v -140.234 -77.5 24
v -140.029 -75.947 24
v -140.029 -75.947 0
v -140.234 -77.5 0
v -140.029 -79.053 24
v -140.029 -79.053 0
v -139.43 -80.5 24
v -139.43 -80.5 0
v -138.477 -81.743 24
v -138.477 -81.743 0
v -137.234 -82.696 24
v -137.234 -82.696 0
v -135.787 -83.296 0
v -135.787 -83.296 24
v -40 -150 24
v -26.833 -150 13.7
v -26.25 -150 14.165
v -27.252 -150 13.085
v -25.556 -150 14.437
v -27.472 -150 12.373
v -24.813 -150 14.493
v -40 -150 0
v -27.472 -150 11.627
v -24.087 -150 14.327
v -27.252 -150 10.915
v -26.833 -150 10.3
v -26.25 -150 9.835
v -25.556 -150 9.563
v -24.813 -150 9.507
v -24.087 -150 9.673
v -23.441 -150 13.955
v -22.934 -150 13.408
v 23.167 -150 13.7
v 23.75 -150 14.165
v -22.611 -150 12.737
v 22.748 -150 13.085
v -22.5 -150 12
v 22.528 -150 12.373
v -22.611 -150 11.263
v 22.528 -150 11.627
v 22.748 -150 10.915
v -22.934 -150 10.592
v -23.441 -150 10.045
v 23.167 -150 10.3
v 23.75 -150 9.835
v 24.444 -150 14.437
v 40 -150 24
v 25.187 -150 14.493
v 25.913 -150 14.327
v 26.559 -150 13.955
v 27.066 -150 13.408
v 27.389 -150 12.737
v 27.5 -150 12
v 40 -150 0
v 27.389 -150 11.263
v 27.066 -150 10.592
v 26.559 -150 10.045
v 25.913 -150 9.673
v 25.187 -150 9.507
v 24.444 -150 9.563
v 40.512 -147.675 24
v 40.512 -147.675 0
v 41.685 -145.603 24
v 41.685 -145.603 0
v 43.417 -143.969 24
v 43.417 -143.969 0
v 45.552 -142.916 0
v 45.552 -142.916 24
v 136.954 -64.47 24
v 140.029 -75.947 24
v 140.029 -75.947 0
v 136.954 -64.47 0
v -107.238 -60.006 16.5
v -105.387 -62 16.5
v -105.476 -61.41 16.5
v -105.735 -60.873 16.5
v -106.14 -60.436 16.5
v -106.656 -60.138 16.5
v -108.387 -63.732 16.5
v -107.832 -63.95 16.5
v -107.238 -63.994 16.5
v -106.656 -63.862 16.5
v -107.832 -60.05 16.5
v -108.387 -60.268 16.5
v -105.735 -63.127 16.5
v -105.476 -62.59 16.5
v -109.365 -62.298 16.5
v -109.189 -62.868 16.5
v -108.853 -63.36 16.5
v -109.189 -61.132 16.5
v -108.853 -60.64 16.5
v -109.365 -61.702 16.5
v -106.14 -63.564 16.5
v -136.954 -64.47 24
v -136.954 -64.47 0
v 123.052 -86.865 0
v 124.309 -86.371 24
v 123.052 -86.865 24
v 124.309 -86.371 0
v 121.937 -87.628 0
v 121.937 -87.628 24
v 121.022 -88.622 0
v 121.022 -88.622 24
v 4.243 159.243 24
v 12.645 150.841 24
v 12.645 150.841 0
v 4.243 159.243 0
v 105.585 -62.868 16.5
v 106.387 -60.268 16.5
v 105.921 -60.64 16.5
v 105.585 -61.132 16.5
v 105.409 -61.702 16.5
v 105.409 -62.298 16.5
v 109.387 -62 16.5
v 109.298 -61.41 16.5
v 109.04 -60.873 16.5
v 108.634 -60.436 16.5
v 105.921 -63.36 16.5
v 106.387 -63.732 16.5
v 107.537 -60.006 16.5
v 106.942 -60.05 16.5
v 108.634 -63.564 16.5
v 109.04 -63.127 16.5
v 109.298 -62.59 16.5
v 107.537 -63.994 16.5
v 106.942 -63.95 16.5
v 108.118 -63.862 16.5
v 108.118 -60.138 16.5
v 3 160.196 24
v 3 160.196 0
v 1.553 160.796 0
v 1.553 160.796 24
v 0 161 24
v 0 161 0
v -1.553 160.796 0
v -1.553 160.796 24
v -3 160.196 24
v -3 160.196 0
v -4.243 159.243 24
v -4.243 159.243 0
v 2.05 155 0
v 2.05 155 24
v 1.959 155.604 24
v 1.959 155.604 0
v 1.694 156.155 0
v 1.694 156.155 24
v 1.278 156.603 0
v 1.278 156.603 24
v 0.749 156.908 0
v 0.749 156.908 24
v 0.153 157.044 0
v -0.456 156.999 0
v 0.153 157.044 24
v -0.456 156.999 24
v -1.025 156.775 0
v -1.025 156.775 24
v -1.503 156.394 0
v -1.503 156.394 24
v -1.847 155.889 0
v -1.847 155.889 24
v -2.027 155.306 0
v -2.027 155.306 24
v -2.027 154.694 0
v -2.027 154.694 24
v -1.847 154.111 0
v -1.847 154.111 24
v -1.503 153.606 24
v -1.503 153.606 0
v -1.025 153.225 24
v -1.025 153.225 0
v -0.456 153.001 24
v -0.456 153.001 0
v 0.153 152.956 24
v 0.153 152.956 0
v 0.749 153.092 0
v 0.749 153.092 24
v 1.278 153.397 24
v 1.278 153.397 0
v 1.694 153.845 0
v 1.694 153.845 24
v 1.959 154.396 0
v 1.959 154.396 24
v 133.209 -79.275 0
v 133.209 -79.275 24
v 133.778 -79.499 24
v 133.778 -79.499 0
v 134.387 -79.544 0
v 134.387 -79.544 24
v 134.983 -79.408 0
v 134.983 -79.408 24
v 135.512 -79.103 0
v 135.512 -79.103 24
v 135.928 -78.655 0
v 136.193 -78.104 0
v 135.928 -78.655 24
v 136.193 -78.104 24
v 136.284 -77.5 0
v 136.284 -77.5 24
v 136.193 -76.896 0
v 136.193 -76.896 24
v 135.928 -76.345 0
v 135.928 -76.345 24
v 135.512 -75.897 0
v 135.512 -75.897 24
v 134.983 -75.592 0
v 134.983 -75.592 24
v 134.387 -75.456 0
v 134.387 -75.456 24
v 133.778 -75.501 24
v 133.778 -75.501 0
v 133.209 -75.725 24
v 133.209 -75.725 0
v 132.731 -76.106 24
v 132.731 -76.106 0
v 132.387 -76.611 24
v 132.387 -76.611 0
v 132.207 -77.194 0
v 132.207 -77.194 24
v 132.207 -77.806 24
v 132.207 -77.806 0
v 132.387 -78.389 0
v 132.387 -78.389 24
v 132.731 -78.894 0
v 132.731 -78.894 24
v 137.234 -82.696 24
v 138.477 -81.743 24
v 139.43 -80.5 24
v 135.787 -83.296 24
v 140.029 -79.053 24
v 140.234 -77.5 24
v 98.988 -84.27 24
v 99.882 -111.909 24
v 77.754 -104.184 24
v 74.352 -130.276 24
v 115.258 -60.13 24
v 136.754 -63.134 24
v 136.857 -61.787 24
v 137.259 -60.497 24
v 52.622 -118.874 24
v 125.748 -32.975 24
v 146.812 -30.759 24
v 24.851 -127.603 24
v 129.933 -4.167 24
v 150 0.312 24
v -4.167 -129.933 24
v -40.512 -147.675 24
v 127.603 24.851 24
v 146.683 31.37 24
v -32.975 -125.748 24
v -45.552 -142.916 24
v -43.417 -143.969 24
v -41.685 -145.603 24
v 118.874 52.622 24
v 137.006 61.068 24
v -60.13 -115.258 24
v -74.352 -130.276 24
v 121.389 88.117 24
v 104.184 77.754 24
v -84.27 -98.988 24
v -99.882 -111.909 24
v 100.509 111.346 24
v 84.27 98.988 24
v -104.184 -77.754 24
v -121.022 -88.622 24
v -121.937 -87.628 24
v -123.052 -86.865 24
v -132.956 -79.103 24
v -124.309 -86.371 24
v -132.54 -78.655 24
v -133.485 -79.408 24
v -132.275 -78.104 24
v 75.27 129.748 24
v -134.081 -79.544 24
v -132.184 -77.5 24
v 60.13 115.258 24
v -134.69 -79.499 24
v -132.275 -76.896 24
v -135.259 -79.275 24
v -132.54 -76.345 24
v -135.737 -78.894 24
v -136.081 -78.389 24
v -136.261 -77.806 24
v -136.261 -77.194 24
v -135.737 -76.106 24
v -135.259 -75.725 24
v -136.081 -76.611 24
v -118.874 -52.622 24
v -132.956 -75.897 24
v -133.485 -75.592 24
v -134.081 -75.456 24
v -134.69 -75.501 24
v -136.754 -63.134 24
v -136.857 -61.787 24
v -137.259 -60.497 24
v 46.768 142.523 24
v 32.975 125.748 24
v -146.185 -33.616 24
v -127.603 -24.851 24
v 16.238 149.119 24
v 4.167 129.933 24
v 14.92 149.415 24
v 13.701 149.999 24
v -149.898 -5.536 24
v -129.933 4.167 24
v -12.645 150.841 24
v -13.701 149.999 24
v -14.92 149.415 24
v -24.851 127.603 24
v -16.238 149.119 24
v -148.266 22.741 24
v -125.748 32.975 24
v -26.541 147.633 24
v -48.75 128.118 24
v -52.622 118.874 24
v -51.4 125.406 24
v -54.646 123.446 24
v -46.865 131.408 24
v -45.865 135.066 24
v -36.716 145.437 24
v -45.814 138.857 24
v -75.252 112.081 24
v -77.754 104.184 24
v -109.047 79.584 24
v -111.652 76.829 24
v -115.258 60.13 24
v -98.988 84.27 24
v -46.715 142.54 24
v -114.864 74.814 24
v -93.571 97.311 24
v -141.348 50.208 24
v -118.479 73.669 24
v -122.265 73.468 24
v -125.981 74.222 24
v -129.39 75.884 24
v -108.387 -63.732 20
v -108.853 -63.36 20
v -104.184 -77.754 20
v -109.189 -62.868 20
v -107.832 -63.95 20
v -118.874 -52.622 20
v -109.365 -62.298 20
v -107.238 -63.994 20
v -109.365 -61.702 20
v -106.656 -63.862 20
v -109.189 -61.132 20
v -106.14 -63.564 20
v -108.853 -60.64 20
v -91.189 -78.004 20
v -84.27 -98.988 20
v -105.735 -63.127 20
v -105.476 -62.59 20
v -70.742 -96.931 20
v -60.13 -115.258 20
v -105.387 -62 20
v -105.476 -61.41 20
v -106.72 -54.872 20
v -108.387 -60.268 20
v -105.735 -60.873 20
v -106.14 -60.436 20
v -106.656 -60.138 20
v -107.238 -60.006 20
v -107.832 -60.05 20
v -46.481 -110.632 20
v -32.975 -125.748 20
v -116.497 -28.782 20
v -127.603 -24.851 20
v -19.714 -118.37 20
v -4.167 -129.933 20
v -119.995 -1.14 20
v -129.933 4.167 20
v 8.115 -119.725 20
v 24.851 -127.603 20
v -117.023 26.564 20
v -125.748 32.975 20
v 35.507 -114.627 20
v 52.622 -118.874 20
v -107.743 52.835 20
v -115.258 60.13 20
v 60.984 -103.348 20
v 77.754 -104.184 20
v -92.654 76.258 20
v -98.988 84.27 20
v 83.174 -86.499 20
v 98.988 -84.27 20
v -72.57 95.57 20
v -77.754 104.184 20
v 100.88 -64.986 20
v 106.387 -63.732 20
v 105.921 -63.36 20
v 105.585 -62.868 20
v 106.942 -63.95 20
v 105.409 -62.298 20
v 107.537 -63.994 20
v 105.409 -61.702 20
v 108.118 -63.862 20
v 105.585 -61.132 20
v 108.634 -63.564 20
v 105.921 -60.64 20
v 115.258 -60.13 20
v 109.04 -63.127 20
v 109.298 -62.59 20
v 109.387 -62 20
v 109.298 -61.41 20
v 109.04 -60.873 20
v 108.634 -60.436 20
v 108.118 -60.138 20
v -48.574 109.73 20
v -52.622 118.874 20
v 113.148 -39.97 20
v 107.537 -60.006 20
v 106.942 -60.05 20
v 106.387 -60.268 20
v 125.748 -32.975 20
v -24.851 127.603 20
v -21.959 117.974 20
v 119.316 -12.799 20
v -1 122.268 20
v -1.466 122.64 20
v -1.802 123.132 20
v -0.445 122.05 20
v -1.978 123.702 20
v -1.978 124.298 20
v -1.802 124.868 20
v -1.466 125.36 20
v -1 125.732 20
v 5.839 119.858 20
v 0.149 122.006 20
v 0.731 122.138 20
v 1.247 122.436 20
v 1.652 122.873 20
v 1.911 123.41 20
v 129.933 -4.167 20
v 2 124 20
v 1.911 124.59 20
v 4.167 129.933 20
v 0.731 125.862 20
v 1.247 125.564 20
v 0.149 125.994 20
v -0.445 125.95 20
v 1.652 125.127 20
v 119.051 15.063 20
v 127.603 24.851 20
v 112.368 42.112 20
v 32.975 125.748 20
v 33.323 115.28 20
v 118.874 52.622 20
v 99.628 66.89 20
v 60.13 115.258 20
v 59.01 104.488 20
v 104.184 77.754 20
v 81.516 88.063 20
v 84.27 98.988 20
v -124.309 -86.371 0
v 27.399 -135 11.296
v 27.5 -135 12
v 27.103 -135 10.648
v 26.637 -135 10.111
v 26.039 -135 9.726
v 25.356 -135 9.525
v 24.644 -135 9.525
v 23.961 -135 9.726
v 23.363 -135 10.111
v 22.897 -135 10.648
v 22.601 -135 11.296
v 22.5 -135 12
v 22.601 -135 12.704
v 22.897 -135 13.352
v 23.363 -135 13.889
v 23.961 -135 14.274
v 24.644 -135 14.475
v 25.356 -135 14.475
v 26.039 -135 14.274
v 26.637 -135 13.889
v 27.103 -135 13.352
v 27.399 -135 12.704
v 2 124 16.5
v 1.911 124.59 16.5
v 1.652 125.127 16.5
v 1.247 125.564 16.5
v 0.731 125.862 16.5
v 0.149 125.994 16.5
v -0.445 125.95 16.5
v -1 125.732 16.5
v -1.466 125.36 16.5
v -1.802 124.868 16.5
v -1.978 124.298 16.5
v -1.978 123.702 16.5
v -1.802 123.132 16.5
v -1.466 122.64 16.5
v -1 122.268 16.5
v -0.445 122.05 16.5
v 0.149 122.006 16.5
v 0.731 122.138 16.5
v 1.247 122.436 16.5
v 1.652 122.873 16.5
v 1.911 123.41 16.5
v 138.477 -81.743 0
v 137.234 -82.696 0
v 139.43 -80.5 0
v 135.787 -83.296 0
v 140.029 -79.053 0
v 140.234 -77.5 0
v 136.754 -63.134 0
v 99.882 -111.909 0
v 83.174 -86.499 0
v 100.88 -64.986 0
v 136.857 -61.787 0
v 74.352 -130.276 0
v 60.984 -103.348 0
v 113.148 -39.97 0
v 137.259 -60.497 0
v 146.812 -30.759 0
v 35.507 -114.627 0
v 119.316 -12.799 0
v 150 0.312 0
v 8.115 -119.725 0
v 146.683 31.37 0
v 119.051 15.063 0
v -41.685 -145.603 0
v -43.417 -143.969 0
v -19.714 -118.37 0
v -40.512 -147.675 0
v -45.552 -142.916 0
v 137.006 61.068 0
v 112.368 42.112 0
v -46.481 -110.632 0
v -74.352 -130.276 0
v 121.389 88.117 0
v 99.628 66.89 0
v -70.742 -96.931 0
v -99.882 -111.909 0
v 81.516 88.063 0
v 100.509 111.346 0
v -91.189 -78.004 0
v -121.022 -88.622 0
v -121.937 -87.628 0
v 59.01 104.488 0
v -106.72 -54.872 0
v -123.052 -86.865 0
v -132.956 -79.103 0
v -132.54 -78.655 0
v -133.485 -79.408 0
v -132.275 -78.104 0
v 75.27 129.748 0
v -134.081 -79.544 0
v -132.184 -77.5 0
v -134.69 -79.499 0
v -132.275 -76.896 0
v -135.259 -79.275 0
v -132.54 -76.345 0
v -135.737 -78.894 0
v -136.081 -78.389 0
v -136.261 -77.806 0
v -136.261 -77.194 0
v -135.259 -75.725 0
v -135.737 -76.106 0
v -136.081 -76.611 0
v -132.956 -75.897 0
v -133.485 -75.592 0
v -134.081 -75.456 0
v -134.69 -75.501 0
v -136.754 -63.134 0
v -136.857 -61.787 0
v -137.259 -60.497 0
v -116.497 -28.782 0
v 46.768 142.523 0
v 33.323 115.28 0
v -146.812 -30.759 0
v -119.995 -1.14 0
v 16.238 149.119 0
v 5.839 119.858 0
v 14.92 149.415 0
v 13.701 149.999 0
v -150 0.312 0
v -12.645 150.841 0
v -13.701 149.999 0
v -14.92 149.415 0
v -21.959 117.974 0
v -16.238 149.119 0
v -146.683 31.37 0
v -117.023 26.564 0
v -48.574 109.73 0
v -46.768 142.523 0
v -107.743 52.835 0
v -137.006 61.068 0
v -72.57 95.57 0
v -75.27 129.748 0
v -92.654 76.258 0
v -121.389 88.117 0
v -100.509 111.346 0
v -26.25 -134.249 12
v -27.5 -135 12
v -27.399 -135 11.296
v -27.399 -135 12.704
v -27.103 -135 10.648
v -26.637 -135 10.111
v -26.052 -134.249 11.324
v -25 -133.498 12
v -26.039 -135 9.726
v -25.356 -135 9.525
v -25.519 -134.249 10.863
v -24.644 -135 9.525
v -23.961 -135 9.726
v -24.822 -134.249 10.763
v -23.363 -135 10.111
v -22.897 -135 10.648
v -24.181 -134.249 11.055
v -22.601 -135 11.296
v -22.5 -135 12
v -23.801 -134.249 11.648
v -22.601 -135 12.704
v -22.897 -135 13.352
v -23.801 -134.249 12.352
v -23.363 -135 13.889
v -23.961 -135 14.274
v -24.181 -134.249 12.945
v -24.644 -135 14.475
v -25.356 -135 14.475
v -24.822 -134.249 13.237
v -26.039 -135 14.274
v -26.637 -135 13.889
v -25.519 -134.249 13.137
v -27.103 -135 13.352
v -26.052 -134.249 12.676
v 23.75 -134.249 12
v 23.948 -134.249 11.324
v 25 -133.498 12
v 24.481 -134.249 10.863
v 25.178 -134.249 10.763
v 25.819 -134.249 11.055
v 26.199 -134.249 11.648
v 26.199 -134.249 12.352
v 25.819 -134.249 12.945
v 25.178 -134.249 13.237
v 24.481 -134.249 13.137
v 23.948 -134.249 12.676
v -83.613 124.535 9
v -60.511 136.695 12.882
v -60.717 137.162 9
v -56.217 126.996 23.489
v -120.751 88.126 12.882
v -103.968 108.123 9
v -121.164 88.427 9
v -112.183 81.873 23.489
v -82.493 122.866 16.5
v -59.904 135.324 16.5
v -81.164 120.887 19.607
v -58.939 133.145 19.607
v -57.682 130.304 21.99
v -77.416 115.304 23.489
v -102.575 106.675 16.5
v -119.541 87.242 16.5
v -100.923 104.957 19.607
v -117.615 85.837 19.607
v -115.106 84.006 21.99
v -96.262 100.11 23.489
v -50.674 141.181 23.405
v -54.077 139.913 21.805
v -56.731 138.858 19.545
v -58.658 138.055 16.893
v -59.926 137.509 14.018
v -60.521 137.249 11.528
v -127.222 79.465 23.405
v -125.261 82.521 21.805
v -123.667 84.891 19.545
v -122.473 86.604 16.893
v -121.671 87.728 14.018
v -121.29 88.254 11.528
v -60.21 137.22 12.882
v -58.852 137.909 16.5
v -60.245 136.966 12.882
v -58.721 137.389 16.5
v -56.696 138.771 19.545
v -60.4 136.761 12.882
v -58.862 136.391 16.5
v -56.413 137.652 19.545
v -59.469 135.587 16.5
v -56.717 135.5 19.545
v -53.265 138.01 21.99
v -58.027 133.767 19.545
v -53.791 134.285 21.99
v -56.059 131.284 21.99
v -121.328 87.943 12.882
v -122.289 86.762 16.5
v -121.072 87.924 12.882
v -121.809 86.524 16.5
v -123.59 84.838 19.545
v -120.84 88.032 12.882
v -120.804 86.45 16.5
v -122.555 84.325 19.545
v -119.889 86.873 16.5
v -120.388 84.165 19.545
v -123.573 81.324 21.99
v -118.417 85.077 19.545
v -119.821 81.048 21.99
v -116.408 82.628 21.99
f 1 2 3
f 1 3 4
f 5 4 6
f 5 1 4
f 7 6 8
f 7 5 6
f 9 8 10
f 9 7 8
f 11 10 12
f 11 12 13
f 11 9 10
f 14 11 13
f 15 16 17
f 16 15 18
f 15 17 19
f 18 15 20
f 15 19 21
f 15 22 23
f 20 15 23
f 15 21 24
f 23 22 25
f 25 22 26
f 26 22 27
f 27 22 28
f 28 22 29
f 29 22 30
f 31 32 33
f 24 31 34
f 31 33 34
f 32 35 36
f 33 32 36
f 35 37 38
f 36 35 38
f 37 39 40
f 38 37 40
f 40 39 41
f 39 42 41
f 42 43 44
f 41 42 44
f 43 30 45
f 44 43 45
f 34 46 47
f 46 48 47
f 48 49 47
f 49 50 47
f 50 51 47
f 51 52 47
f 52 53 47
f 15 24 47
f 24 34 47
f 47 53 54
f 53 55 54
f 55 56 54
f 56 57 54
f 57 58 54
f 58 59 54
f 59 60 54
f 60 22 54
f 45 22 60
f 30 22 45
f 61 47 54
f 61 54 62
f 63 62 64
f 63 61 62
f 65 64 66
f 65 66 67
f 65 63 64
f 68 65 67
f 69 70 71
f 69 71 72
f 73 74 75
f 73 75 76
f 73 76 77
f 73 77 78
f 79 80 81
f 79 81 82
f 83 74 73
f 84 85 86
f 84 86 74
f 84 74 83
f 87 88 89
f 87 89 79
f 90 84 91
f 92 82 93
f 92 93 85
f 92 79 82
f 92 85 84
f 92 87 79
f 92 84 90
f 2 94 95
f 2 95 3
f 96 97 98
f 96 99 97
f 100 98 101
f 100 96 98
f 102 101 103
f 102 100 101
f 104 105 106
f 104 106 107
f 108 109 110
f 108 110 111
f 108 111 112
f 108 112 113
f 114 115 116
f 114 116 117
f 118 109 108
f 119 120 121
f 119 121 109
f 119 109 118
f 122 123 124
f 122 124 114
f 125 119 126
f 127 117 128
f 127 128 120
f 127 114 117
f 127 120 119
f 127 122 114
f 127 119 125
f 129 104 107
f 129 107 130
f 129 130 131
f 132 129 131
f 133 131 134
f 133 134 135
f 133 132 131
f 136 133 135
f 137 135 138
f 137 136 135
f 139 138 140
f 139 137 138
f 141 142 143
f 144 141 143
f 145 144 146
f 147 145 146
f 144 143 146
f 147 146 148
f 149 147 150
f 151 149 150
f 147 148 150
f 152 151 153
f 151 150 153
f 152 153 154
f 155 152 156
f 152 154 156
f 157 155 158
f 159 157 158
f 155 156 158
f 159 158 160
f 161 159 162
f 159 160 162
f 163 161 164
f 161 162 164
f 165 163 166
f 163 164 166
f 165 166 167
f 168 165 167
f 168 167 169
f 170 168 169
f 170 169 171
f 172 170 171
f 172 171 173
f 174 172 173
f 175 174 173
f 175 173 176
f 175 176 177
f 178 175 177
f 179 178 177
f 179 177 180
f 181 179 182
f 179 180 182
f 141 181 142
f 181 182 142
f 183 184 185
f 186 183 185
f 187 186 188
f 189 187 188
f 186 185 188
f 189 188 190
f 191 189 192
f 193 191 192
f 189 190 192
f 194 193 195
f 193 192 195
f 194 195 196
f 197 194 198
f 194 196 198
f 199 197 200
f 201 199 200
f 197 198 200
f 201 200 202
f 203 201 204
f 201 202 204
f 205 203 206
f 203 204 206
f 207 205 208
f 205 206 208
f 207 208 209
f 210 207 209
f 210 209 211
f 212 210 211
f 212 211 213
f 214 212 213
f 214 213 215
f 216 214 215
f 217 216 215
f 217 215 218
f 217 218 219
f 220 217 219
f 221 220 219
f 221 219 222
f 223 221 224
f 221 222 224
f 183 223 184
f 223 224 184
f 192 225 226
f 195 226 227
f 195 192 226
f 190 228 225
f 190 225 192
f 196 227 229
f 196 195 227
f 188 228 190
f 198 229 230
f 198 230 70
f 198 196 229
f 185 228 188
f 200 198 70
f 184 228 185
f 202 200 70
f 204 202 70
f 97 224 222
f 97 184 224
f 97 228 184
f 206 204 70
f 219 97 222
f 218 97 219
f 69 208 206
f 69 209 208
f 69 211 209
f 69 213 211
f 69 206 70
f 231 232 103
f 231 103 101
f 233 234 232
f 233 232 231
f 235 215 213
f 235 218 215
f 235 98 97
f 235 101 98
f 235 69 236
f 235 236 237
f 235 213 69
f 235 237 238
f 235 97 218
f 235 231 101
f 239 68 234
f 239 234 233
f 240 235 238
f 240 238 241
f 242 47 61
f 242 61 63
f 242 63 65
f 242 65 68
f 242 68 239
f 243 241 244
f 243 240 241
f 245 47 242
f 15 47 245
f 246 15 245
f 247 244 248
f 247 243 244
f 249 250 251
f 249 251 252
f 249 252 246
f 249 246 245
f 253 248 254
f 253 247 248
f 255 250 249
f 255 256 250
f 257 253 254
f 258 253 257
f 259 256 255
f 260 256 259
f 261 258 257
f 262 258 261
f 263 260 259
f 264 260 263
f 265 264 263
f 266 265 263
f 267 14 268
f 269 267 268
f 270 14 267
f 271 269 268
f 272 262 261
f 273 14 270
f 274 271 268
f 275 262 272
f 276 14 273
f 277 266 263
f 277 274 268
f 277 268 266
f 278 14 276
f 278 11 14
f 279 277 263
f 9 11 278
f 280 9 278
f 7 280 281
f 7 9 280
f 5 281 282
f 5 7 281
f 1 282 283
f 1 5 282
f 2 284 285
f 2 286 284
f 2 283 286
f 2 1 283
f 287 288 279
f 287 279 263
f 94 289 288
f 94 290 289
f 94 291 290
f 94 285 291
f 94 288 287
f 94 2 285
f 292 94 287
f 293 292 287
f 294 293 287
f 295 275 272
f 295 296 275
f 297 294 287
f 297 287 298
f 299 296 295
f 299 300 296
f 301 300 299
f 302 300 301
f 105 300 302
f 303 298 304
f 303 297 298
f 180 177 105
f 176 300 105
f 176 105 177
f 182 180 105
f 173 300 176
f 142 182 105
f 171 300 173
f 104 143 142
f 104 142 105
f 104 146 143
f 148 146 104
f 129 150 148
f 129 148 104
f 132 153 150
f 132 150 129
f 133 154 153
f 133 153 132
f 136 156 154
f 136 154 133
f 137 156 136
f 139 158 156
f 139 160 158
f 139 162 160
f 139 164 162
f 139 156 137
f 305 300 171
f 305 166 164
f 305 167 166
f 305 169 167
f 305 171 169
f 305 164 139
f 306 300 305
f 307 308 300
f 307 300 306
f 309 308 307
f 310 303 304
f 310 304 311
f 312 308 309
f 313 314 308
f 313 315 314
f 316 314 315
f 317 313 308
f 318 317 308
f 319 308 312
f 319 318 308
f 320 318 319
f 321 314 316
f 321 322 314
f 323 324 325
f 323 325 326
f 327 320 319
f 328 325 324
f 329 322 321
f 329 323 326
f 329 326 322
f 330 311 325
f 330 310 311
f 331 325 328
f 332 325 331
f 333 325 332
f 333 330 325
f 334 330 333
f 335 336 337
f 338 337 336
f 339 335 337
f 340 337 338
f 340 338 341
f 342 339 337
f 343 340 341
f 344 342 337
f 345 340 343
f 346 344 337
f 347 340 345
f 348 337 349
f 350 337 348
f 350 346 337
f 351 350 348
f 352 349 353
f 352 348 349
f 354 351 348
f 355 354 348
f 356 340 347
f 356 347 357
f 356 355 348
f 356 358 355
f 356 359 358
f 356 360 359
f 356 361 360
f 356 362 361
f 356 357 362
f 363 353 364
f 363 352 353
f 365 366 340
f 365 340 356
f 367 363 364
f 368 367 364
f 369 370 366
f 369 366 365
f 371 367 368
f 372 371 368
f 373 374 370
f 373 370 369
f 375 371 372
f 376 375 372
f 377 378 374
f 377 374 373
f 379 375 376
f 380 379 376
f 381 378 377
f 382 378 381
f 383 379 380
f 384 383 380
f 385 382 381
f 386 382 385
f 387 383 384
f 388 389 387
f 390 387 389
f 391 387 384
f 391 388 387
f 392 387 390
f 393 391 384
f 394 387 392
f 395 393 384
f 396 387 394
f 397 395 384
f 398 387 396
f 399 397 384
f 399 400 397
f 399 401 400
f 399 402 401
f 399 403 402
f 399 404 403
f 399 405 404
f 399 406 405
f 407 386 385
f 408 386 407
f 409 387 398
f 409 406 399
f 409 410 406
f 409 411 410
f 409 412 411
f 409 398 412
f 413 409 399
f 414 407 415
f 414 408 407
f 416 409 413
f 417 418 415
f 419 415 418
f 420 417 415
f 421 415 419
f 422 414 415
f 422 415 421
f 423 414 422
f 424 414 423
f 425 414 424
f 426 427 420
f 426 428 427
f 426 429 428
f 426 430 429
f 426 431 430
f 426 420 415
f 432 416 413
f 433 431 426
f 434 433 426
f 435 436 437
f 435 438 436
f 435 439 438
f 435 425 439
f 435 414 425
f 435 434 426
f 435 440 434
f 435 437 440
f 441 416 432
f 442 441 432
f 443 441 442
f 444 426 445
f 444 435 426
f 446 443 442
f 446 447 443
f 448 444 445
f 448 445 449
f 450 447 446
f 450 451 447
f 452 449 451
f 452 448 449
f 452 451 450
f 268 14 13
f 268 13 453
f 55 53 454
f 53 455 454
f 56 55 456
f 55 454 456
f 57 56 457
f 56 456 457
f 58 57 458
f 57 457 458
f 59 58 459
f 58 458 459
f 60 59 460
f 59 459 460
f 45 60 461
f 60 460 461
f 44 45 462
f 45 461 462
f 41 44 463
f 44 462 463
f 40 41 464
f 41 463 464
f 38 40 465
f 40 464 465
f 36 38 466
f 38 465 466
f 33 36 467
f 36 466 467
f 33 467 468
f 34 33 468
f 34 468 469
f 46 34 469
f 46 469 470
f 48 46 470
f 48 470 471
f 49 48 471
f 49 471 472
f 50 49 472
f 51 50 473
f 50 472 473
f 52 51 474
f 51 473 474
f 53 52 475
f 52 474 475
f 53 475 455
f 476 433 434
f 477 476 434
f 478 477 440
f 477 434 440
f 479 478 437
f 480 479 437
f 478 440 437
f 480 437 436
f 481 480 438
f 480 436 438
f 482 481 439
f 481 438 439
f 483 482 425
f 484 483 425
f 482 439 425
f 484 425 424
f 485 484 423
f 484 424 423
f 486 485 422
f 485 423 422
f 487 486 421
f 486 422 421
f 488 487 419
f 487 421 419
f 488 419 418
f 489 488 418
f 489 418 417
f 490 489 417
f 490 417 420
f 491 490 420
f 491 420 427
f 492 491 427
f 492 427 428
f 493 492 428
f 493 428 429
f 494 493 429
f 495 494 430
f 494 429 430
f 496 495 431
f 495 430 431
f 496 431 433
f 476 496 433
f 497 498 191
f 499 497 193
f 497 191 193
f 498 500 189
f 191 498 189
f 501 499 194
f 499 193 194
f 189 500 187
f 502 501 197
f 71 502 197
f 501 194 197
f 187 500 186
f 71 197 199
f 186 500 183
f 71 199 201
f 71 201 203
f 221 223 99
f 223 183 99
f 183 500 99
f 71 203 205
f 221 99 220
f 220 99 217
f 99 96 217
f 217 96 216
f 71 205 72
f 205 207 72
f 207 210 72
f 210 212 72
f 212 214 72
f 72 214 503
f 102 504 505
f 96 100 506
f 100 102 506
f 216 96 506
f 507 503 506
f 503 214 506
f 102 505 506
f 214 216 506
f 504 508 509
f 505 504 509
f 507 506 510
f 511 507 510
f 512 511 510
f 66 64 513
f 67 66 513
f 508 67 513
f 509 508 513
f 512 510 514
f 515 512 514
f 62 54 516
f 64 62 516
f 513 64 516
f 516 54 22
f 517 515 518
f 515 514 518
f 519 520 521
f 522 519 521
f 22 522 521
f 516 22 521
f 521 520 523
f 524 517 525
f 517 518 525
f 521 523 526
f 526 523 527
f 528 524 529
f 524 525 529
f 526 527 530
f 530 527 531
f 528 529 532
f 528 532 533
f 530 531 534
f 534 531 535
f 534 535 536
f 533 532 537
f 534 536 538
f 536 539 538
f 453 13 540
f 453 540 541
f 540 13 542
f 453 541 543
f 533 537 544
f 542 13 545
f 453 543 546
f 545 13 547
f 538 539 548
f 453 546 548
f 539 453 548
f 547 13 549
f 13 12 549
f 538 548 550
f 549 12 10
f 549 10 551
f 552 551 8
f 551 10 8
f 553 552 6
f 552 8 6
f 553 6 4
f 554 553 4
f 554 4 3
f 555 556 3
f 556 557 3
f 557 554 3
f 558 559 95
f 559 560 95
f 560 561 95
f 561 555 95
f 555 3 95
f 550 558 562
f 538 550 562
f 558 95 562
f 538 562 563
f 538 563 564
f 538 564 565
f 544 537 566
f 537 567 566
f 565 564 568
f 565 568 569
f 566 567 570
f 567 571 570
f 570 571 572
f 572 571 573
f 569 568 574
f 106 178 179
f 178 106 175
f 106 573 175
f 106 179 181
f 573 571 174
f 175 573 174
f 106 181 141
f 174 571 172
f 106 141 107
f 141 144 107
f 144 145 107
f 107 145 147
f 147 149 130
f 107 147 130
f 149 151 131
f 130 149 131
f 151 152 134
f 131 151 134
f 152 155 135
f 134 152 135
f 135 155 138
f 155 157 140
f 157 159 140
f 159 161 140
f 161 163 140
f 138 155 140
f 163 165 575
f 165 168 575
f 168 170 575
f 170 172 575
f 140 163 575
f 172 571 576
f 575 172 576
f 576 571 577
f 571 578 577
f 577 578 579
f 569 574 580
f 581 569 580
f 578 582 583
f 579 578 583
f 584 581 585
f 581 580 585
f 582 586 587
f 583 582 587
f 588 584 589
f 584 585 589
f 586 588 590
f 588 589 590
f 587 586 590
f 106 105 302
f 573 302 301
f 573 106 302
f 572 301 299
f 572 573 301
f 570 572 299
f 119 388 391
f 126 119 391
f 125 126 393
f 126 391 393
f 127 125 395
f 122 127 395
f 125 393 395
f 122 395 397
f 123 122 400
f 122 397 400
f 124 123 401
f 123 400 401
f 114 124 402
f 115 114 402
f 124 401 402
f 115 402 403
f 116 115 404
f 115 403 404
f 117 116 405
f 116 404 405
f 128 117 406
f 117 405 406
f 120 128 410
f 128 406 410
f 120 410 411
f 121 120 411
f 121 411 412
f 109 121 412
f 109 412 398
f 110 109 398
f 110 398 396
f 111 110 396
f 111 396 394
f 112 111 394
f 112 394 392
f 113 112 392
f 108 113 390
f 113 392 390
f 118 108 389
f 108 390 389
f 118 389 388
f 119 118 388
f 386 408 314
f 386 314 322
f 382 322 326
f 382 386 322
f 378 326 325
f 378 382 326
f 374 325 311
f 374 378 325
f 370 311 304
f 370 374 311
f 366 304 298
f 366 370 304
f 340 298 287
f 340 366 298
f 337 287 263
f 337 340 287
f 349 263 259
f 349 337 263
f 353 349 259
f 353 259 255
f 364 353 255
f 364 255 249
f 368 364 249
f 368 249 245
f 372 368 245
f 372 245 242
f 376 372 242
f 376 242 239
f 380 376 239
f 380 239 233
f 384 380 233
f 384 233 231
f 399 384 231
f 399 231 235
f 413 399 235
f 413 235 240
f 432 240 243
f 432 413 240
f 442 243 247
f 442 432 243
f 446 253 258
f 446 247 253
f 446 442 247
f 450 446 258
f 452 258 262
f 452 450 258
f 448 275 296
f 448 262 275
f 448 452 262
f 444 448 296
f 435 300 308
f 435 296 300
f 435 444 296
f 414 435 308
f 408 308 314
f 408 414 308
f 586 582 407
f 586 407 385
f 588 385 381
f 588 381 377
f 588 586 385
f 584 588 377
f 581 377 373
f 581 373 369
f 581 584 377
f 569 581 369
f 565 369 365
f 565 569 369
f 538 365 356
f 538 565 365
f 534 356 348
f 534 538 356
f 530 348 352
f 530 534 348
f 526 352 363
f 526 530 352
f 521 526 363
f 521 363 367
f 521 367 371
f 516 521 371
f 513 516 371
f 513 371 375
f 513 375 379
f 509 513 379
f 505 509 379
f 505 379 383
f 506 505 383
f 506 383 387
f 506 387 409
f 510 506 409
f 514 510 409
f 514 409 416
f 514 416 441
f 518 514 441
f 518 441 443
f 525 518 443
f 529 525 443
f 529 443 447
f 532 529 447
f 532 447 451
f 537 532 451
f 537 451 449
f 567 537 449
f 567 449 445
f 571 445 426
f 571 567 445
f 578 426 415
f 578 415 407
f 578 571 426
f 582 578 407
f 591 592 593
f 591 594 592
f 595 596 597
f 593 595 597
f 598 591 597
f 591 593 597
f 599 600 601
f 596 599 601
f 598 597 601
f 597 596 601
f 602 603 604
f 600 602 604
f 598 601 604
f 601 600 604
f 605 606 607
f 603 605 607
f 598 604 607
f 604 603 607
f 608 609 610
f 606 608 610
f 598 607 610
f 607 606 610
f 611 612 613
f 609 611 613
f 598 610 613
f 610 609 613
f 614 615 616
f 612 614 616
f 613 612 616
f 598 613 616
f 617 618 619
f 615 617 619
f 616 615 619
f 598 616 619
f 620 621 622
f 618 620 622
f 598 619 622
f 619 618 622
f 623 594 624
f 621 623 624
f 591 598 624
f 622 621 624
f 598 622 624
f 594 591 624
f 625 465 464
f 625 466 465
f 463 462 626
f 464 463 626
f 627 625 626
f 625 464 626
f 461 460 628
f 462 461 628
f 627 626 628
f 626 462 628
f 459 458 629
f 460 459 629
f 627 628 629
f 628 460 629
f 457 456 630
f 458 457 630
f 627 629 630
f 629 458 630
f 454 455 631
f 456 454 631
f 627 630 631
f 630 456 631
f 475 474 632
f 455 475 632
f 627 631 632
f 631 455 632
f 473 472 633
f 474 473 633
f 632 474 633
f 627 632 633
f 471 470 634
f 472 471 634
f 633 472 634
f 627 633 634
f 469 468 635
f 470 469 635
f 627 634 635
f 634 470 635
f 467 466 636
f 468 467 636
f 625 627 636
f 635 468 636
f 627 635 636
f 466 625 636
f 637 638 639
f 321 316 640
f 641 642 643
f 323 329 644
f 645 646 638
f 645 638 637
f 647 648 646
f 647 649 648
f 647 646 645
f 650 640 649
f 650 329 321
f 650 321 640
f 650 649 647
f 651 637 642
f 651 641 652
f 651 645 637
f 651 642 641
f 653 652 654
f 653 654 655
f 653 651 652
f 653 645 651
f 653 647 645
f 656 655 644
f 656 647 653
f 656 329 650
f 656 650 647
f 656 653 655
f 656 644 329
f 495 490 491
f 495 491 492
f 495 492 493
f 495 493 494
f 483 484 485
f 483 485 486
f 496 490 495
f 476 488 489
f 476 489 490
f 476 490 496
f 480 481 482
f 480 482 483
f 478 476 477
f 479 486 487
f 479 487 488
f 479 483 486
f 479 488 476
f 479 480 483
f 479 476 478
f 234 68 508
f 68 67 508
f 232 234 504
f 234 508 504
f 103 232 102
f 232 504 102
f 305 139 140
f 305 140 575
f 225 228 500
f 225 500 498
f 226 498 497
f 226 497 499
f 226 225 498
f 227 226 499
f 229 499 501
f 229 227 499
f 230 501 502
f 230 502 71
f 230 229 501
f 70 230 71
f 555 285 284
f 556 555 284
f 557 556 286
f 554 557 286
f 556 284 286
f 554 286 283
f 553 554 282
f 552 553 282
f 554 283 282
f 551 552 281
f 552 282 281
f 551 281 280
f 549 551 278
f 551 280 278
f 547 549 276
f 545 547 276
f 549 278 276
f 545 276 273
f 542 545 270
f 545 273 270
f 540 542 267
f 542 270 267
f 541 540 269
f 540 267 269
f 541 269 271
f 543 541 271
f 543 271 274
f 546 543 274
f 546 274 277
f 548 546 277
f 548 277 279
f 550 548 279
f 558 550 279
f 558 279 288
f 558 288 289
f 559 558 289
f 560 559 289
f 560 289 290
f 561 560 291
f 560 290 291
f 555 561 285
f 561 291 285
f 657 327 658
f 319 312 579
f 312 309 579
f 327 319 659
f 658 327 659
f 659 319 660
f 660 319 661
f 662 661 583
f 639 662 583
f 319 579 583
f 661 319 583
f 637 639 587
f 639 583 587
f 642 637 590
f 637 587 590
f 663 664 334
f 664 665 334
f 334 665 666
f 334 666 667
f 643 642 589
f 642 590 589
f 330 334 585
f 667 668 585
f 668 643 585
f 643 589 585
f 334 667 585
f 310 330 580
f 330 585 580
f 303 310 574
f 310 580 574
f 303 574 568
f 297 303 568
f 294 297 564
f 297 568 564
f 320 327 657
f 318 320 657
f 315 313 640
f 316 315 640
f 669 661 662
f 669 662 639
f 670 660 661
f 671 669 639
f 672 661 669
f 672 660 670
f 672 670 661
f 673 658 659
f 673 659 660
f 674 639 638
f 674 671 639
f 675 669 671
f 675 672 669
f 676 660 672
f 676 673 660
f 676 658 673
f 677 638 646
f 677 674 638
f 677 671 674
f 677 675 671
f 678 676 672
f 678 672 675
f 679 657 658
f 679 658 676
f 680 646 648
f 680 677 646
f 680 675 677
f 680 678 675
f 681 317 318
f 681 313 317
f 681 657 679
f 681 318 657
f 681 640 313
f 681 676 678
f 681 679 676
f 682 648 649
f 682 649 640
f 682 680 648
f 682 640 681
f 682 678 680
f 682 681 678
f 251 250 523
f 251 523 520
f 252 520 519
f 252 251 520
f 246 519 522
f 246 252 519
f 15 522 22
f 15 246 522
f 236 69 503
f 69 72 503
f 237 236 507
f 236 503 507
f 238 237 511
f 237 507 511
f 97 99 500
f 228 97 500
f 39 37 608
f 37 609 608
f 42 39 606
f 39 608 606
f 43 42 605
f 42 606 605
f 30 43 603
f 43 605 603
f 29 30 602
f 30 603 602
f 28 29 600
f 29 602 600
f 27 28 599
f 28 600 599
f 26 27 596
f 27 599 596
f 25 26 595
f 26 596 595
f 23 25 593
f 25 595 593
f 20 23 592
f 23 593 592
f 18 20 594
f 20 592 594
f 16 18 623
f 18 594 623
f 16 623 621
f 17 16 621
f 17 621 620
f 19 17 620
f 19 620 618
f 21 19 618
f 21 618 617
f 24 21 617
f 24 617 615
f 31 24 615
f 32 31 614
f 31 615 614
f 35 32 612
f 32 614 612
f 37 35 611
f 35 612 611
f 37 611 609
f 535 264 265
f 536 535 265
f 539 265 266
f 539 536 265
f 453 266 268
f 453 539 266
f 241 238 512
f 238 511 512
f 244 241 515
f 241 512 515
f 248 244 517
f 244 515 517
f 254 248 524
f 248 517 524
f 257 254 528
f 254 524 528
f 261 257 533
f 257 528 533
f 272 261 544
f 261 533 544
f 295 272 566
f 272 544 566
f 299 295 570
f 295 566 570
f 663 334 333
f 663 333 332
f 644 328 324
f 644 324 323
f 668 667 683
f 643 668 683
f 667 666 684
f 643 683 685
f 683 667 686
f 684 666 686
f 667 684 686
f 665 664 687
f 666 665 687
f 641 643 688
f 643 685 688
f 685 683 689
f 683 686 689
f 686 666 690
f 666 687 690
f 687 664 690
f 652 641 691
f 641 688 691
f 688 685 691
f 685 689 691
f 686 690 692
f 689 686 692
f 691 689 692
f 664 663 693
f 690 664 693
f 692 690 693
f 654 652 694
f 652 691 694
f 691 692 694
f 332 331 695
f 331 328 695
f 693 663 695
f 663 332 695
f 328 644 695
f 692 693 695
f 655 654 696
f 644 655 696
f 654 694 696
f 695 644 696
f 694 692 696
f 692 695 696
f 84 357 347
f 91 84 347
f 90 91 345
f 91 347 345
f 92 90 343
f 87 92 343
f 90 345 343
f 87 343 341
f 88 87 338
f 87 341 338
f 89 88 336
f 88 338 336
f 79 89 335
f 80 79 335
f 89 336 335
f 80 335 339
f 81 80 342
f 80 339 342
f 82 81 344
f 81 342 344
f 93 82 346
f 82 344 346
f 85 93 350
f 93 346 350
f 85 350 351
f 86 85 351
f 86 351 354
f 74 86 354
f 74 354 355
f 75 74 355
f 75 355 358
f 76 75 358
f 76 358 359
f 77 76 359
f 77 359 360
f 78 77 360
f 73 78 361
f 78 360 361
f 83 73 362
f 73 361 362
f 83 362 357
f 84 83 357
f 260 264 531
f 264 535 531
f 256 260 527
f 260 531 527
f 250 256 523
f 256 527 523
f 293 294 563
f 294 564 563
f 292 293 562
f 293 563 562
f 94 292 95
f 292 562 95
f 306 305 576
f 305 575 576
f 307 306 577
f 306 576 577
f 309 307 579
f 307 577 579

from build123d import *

# Parameters (mm, degrees)
SKETCH1_R                 = 150.00000000000003
SKETCH1_R_2               = 120
BOSS_EXTRUDE1_DEPTH       = 20
SKETCH2_R                 = 2.0000000000000018
CUT_EXTRUDE1_DEPTH        = 3.5
CIRPATTERN1_COUNT         = 3
SKETCH8_R                 = 150.00000000000006
SKETCH8_R_2               = 130
BOSS_EXTRUDE2_DEPTH       = 4
SPLIT1_SURFACE_1_BACK     = 425.942
SPLIT1_SURFACE_1_DEPTH    = 851.884
SPLIT1_SURFACE_2_BACK     = 425.942
SPLIT1_SURFACE_2_DEPTH    = 851.884
FILLET1_R                 = 15
SKETCH9_R                 = 2.049999999999871
BOSS_EXTRUDE3_DEPTH       = 24
FILLET2_R                 = 6
CIRPATTERN2_COUNT         = 3
FILLET2_OF_CIRPATTERN2_R  = 6
BOSS_EXTRUDE6_REACH       = 348.117
BOSS_EXTRUDE6_END_RADIUS  = 150.00000000000003
FILLET5_R                 = 8
M6X1_0_TAPPED_HOLE1_D     = 5
M6X1_0_TAPPED_HOLE1_DEPTH = 15
M6X1_0_TAPPED_HOLE1_TIP   = 1.5021515475689007


with BuildPart() as part:
    # Sketch1 → Boss-Extrude1 (new body)
    with BuildSketch(Plane.XY):
        Circle(SKETCH1_R)
        Circle(SKETCH1_R_2, mode=Mode.SUBTRACT)
    extrude(amount=BOSS_EXTRUDE1_DEPTH)

    # Sketch2 → Cut-Extrude1 (cut)
    with BuildSketch(Plane.XY.offset(20)):
        with Locations((0, 124)):
            Circle(SKETCH2_R)
    cut_extrude1 = extrude(amount=-CUT_EXTRUDE1_DEPTH, mode=Mode.SUBTRACT)

    # CirPattern1: Cut-Extrude1 ×3 about axis
    cirpattern1_axis = Axis((-4.94e-15, -7.48e-15, 0), (0, 0, 1))
    for i in range(1, CIRPATTERN1_COUNT):
        add(cut_extrude1.rotate(cirpattern1_axis, i * 360 / CIRPATTERN1_COUNT), mode=Mode.SUBTRACT)

    # Sketch8 → Boss-Extrude2 (add)
    with BuildSketch(Plane.XY.offset(20)):
        Circle(SKETCH8_R)
        Circle(SKETCH8_R_2, mode=Mode.SUBTRACT)
    extrude(amount=BOSS_EXTRUDE2_DEPTH)


with BuildPart() as body_2:
    # Split1: the piece behind the surface
    add(part.part)
    # Split1 surface: a surface, the sketch's curves swept straight by 851.884 mm
    with BuildLine(Plane.XY.offset(20).offset(-SPLIT1_SURFACE_1_BACK), mode=Mode.PRIVATE) as split1_surface_1_path:
        Line((-60.71743008822855, 137.16192505021607), (0, 0))
        Line((0, 0), (-121.16379943401968, 88.42699648134986))
    split1_surface_1 = Shell.extrude(split1_surface_1_path.wire(), (0 * SPLIT1_SURFACE_1_DEPTH, 0 * SPLIT1_SURFACE_1_DEPTH, 1 * SPLIT1_SURFACE_1_DEPTH))
    split(bisect_by=split1_surface_1, keep=Keep.BOTTOM)

    # Fillet1
    fillet1_edges = [body_2.edges().sort_by_distance(p)[0] for p in [
        (-94.14865229404315, 116.77341851301341, 24),
    ]]
    fillet(fillet1_edges, radius=FILLET1_R)


with BuildPart() as part_1:
    add(part.part)

    # Split1: split by a surface, the side it looks to stays
    # Split1 surface: a surface, the sketch's curves swept straight by 851.884 mm
    with BuildLine(Plane.XY.offset(20).offset(-SPLIT1_SURFACE_2_BACK), mode=Mode.PRIVATE) as split1_surface_2_path:
        Line((-60.71743008822855, 137.16192505021607), (0, 0))
        Line((0, 0), (-121.16379943401968, 88.42699648134986))
    split1_surface_2 = Shell.extrude(split1_surface_2_path.wire(), (0 * SPLIT1_SURFACE_2_DEPTH, 0 * SPLIT1_SURFACE_2_DEPTH, 1 * SPLIT1_SURFACE_2_DEPTH))
    split(bisect_by=split1_surface_2, keep=Keep.TOP)

    # Sketch6 → Cut-Revolve2 (revolve, cut)
    with BuildSketch(Plane(origin=(0, 0, 0), x_dir=(0, 0, 1), z_dir=(-0.914412833668107, -0.40478286725485696, 0))):
        with BuildLine():
            Line((24, 135.00000000000006), (24, 150.00000000000006))
            Line((24, 150.00000000000006), (9, 150.00000000000006))
            ThreePointArc((9.000000000000004, 150.00000000000006), (19.606601717798213, 145.60660171779824), (23.999999999999993, 135.00000000000003))
        make_face()
    cut_revolve2 = revolve(axis=Axis((-60.71743008822857, 137.1619250502161, 24), (0, 0, -1)), mode=Mode.SUBTRACT)

    # Mirror1: Cut-Revolve2 across plane
    add(cut_revolve2.mirror(Plane(origin=(0, 0, 0), x_dir=(0, 0, 1), z_dir=(-0.7784894567534315, -0.6276576819602762, 0))), mode=Mode.SUBTRACT)


with BuildPart() as body_2_1:
    add(body_2.part)

    # Combine1: union part
    add(part_1.part)

    # Sketch9 → Boss-Extrude3 (add)
    # profile 1 of 3: a face of its own
    with BuildSketch(Plane.XY.offset(24)):
        with BuildLine():
            ThreePointArc((-3.262499377045517, 149.96451612903218), (-5.966798192877617, 154.36966728986033), (-4.24264068711927, 159.2426406871193))
            Line((-4.242640687119266, 159.2426406871193), (-14.15461886744679, 149.33066250679175))
            ThreePointArc((-14.1546188674468, 149.33066250679167), (-8.714324103983273, 149.7466545716823), (-3.2624993770454083, 149.9645161290323))
        make_face()
    # profile 2 of 3: a face of its own
    with BuildSketch(Plane.XY.offset(24)):
        with BuildLine():
            Line((14.154618867446969, 149.3306625067917), (4.242640687119273, 159.24264068711932))
            ThreePointArc((4.242640687119273, 159.24264068711932), (5.543277195067717, 157.29610059419056), (6, 155.00000000000003))
            ThreePointArc((6, 155.00000000000003), (5.27138483997677, 152.13425369774941), (3.262499377045641, 149.96451612903223))
            ThreePointArc((3.262499377045714, 149.96451612903223), (8.714324103983444, 149.7466545716823), (14.154618867446963, 149.33066250679167))
        make_face()
    # profile 3 of 3: a face of its own
    with BuildSketch(Plane.XY.offset(24)):
        with BuildLine():
            ThreePointArc((4.242640687119273, 159.24264068711932), (-3.07e-15, 161), (-4.242640687119268, 159.2426406871193))
            ThreePointArc((-4.24264068711927, 159.2426406871193), (-5.966798192877617, 154.36966728986033), (-3.262499377045517, 149.96451612903218))
            ThreePointArc((-3.2624993770454083, 149.9645161290323), (1.4921e-13, 150), (3.262499377045714, 149.96451612903223))
            ThreePointArc((3.262499377045641, 149.96451612903223), (5.27138483997677, 152.13425369774941), (6, 155.00000000000003))
            ThreePointArc((6, 155.00000000000003), (5.543277195067717, 157.29610059419056), (4.242640687119273, 159.24264068711932))
        make_face()
        with Locations((1.388e-14, 155.00000000000003)):
            Circle(SKETCH9_R, mode=Mode.SUBTRACT)
    boss_extrude3 = extrude(amount=-BOSS_EXTRUDE3_DEPTH)

    # Fillet2
    fillet2_edges = [body_2_1.edges().sort_by_distance(p)[0] for p in [
        (-14.154618867446795, 149.33066250679173, 12),
        (14.154618867446967, 149.33066250679167, 12),
    ]]
    fillet(fillet2_edges, radius=FILLET2_R)

    # CirPattern2: Boss-Extrude3 ×3 about axis
    cirpattern2_axis = Axis((1.08e-15, -6.48e-15, 0), (0, 0, 1))
    for i in range(1, CIRPATTERN2_COUNT):
        add(boss_extrude3.rotate(cirpattern2_axis, i * 360 / CIRPATTERN2_COUNT))

    # Fillet2 of CirPattern2
    fillet2_of_cirpattern2_edges = [body_2_1.edges().sort_by_distance(p)[0] for p in [
        (-122.24683786111865, -86.9235907734913, 12),
        (-136.40145672856548, -62.40707173330022, 12),
        (136.4014567285654, -62.407071733300505, 12),
        (122.24683786111846, -86.92359077349151, 12),
    ]]
    fillet(fillet2_of_cirpattern2_edges, radius=FILLET2_OF_CIRPATTERN2_R)

    # Boss-Extrude6: up to this cylinder (the profile starts outside it)
    boss_extrude6_end = Plane(origin=(0, 0, 12), z_dir=(0, 0, -1)) * Cylinder(BOSS_EXTRUDE6_END_RADIUS, 997.2340000000002, mode=Mode.PRIVATE)
    # Sketch12 → Boss-Extrude6 (add, up to the surface)
    with BuildSketch(Plane(origin=(0, -150.00000000000003, 0), x_dir=(-1, 0, 0), z_dir=(0, -1, 0)), mode=Mode.PRIVATE) as boss_extrude6_sk1:
        Polygon((0, 0), (-40, -4.9e-15), (-40.00000000000001, -24), (0, -24), align=None)
    boss_extrude6_tool1 = extrude(boss_extrude6_sk1.sketch, amount=-BOSS_EXTRUDE6_REACH, mode=Mode.PRIVATE) - boss_extrude6_end
    add(boss_extrude6_tool1.solids().sort_by_distance((20, -150, 12))[0])
    # Sketch12 → Boss-Extrude6 (add, up to the surface)
    with BuildSketch(Plane(origin=(0, -150.00000000000003, 0), x_dir=(-1, 0, 0), z_dir=(0, -1, 0)), mode=Mode.PRIVATE) as boss_extrude6_sk2:
        Polygon((40, 0), (40.00000000000001, -24), (0, -24), (0, 0), align=None)
    boss_extrude6_tool2 = extrude(boss_extrude6_sk2.sketch, amount=-BOSS_EXTRUDE6_REACH, mode=Mode.PRIVATE) - boss_extrude6_end
    add(boss_extrude6_tool2.solids().sort_by_distance((-20, -150, 12))[0])

    # Fillet5
    # the kernel refuses this fillet: 8 mm, written as the material it adds along each edge
    with BuildSketch(Plane(origin=(40.00000000000015, -144.56832294800958, 24), x_dir=(0.9584597244138898, 0.2852279030467574, 0), z_dir=(0, 0, -1))) as fillet5_piece_1:
        with BuildLine():
            CenterArc((5.947542883110703, 7.998508324991874), FILLET5_R, 200.42971386414416, 68.4638241646868)
            Line((-1.5492658555665646, 5.2060436903559735), (-1.699202030340109, 5.1501943976632605))
            ThreePointArc((-1.699202030340109, 5.1501943976632605), (-0.9279864836895695, 2.5573853806904863), (-0.1533535559062191, -0.04563646448748021))
            Line((-0.1533535559062191, -0.04563646448748021), (0.00308963266655187, -0.15997016649984888))
            ThreePointArc((0.00308963266655187, -0.15997016649984888), (2.8965306248915494, -0.1320310935977963), (5.7899716171165965, -0.15997016649985063))
            Line((5.7899716171165965, -0.15997016649985063), (5.793061249783145, 1.4e-16))
        make_face()
    extrude(amount=24)
    with BuildSketch(Plane(origin=(-40.00000000000015, -144.56832294800958, 24), x_dir=(1.57e-14, -1, 0), z_dir=(0, 0, -1))) as fillet5_piece_2:
        with BuildLine():
            CenterArc((5.969842900063457, 7.98187806972569), FILLET5_R, 197.67893389575954, 68.46382416468674)
            Line((-1.652342712497161, 5.552415888979961), (-1.804786424748387, 5.503826645365045))
            ThreePointArc((-1.804786424748387, 5.503826645365045), (-0.9527178418323817, 2.738548992526119), (-0.1542062111445539, -0.04266666666667149))
            Line((-0.1542062111445539, -0.04266666666667149), (2.51e-15, -0.1599999999999966))
            ThreePointArc((2.51e-15, -0.1599999999999966), (2.7158385259952267, -0.16000000000009607), (5.420913735028992, -0.15963756139451152))
            Line((5.420913735028992, -0.15963756139451152), (5.431677051990448, 0))
        make_face()
    extrude(amount=24)

    # M6x1.0 Tapped Hole1
    with Locations(Plane(origin=(0, -150.00000000000003, 0), x_dir=(-1, 0, 0), z_dir=(0, -1, 0))):
        with Locations((-25, -12), (25, -12)):
            Hole(M6X1_0_TAPPED_HOLE1_D / 2, depth=M6X1_0_TAPPED_HOLE1_DEPTH)
            with Locations((0, 0, -(M6X1_0_TAPPED_HOLE1_DEPTH + M6X1_0_TAPPED_HOLE1_TIP / 2))):  # 118° drill point
                Cone(0, M6X1_0_TAPPED_HOLE1_D / 2, M6X1_0_TAPPED_HOLE1_TIP, mode=Mode.SUBTRACT)


solid = body_2_1.part
